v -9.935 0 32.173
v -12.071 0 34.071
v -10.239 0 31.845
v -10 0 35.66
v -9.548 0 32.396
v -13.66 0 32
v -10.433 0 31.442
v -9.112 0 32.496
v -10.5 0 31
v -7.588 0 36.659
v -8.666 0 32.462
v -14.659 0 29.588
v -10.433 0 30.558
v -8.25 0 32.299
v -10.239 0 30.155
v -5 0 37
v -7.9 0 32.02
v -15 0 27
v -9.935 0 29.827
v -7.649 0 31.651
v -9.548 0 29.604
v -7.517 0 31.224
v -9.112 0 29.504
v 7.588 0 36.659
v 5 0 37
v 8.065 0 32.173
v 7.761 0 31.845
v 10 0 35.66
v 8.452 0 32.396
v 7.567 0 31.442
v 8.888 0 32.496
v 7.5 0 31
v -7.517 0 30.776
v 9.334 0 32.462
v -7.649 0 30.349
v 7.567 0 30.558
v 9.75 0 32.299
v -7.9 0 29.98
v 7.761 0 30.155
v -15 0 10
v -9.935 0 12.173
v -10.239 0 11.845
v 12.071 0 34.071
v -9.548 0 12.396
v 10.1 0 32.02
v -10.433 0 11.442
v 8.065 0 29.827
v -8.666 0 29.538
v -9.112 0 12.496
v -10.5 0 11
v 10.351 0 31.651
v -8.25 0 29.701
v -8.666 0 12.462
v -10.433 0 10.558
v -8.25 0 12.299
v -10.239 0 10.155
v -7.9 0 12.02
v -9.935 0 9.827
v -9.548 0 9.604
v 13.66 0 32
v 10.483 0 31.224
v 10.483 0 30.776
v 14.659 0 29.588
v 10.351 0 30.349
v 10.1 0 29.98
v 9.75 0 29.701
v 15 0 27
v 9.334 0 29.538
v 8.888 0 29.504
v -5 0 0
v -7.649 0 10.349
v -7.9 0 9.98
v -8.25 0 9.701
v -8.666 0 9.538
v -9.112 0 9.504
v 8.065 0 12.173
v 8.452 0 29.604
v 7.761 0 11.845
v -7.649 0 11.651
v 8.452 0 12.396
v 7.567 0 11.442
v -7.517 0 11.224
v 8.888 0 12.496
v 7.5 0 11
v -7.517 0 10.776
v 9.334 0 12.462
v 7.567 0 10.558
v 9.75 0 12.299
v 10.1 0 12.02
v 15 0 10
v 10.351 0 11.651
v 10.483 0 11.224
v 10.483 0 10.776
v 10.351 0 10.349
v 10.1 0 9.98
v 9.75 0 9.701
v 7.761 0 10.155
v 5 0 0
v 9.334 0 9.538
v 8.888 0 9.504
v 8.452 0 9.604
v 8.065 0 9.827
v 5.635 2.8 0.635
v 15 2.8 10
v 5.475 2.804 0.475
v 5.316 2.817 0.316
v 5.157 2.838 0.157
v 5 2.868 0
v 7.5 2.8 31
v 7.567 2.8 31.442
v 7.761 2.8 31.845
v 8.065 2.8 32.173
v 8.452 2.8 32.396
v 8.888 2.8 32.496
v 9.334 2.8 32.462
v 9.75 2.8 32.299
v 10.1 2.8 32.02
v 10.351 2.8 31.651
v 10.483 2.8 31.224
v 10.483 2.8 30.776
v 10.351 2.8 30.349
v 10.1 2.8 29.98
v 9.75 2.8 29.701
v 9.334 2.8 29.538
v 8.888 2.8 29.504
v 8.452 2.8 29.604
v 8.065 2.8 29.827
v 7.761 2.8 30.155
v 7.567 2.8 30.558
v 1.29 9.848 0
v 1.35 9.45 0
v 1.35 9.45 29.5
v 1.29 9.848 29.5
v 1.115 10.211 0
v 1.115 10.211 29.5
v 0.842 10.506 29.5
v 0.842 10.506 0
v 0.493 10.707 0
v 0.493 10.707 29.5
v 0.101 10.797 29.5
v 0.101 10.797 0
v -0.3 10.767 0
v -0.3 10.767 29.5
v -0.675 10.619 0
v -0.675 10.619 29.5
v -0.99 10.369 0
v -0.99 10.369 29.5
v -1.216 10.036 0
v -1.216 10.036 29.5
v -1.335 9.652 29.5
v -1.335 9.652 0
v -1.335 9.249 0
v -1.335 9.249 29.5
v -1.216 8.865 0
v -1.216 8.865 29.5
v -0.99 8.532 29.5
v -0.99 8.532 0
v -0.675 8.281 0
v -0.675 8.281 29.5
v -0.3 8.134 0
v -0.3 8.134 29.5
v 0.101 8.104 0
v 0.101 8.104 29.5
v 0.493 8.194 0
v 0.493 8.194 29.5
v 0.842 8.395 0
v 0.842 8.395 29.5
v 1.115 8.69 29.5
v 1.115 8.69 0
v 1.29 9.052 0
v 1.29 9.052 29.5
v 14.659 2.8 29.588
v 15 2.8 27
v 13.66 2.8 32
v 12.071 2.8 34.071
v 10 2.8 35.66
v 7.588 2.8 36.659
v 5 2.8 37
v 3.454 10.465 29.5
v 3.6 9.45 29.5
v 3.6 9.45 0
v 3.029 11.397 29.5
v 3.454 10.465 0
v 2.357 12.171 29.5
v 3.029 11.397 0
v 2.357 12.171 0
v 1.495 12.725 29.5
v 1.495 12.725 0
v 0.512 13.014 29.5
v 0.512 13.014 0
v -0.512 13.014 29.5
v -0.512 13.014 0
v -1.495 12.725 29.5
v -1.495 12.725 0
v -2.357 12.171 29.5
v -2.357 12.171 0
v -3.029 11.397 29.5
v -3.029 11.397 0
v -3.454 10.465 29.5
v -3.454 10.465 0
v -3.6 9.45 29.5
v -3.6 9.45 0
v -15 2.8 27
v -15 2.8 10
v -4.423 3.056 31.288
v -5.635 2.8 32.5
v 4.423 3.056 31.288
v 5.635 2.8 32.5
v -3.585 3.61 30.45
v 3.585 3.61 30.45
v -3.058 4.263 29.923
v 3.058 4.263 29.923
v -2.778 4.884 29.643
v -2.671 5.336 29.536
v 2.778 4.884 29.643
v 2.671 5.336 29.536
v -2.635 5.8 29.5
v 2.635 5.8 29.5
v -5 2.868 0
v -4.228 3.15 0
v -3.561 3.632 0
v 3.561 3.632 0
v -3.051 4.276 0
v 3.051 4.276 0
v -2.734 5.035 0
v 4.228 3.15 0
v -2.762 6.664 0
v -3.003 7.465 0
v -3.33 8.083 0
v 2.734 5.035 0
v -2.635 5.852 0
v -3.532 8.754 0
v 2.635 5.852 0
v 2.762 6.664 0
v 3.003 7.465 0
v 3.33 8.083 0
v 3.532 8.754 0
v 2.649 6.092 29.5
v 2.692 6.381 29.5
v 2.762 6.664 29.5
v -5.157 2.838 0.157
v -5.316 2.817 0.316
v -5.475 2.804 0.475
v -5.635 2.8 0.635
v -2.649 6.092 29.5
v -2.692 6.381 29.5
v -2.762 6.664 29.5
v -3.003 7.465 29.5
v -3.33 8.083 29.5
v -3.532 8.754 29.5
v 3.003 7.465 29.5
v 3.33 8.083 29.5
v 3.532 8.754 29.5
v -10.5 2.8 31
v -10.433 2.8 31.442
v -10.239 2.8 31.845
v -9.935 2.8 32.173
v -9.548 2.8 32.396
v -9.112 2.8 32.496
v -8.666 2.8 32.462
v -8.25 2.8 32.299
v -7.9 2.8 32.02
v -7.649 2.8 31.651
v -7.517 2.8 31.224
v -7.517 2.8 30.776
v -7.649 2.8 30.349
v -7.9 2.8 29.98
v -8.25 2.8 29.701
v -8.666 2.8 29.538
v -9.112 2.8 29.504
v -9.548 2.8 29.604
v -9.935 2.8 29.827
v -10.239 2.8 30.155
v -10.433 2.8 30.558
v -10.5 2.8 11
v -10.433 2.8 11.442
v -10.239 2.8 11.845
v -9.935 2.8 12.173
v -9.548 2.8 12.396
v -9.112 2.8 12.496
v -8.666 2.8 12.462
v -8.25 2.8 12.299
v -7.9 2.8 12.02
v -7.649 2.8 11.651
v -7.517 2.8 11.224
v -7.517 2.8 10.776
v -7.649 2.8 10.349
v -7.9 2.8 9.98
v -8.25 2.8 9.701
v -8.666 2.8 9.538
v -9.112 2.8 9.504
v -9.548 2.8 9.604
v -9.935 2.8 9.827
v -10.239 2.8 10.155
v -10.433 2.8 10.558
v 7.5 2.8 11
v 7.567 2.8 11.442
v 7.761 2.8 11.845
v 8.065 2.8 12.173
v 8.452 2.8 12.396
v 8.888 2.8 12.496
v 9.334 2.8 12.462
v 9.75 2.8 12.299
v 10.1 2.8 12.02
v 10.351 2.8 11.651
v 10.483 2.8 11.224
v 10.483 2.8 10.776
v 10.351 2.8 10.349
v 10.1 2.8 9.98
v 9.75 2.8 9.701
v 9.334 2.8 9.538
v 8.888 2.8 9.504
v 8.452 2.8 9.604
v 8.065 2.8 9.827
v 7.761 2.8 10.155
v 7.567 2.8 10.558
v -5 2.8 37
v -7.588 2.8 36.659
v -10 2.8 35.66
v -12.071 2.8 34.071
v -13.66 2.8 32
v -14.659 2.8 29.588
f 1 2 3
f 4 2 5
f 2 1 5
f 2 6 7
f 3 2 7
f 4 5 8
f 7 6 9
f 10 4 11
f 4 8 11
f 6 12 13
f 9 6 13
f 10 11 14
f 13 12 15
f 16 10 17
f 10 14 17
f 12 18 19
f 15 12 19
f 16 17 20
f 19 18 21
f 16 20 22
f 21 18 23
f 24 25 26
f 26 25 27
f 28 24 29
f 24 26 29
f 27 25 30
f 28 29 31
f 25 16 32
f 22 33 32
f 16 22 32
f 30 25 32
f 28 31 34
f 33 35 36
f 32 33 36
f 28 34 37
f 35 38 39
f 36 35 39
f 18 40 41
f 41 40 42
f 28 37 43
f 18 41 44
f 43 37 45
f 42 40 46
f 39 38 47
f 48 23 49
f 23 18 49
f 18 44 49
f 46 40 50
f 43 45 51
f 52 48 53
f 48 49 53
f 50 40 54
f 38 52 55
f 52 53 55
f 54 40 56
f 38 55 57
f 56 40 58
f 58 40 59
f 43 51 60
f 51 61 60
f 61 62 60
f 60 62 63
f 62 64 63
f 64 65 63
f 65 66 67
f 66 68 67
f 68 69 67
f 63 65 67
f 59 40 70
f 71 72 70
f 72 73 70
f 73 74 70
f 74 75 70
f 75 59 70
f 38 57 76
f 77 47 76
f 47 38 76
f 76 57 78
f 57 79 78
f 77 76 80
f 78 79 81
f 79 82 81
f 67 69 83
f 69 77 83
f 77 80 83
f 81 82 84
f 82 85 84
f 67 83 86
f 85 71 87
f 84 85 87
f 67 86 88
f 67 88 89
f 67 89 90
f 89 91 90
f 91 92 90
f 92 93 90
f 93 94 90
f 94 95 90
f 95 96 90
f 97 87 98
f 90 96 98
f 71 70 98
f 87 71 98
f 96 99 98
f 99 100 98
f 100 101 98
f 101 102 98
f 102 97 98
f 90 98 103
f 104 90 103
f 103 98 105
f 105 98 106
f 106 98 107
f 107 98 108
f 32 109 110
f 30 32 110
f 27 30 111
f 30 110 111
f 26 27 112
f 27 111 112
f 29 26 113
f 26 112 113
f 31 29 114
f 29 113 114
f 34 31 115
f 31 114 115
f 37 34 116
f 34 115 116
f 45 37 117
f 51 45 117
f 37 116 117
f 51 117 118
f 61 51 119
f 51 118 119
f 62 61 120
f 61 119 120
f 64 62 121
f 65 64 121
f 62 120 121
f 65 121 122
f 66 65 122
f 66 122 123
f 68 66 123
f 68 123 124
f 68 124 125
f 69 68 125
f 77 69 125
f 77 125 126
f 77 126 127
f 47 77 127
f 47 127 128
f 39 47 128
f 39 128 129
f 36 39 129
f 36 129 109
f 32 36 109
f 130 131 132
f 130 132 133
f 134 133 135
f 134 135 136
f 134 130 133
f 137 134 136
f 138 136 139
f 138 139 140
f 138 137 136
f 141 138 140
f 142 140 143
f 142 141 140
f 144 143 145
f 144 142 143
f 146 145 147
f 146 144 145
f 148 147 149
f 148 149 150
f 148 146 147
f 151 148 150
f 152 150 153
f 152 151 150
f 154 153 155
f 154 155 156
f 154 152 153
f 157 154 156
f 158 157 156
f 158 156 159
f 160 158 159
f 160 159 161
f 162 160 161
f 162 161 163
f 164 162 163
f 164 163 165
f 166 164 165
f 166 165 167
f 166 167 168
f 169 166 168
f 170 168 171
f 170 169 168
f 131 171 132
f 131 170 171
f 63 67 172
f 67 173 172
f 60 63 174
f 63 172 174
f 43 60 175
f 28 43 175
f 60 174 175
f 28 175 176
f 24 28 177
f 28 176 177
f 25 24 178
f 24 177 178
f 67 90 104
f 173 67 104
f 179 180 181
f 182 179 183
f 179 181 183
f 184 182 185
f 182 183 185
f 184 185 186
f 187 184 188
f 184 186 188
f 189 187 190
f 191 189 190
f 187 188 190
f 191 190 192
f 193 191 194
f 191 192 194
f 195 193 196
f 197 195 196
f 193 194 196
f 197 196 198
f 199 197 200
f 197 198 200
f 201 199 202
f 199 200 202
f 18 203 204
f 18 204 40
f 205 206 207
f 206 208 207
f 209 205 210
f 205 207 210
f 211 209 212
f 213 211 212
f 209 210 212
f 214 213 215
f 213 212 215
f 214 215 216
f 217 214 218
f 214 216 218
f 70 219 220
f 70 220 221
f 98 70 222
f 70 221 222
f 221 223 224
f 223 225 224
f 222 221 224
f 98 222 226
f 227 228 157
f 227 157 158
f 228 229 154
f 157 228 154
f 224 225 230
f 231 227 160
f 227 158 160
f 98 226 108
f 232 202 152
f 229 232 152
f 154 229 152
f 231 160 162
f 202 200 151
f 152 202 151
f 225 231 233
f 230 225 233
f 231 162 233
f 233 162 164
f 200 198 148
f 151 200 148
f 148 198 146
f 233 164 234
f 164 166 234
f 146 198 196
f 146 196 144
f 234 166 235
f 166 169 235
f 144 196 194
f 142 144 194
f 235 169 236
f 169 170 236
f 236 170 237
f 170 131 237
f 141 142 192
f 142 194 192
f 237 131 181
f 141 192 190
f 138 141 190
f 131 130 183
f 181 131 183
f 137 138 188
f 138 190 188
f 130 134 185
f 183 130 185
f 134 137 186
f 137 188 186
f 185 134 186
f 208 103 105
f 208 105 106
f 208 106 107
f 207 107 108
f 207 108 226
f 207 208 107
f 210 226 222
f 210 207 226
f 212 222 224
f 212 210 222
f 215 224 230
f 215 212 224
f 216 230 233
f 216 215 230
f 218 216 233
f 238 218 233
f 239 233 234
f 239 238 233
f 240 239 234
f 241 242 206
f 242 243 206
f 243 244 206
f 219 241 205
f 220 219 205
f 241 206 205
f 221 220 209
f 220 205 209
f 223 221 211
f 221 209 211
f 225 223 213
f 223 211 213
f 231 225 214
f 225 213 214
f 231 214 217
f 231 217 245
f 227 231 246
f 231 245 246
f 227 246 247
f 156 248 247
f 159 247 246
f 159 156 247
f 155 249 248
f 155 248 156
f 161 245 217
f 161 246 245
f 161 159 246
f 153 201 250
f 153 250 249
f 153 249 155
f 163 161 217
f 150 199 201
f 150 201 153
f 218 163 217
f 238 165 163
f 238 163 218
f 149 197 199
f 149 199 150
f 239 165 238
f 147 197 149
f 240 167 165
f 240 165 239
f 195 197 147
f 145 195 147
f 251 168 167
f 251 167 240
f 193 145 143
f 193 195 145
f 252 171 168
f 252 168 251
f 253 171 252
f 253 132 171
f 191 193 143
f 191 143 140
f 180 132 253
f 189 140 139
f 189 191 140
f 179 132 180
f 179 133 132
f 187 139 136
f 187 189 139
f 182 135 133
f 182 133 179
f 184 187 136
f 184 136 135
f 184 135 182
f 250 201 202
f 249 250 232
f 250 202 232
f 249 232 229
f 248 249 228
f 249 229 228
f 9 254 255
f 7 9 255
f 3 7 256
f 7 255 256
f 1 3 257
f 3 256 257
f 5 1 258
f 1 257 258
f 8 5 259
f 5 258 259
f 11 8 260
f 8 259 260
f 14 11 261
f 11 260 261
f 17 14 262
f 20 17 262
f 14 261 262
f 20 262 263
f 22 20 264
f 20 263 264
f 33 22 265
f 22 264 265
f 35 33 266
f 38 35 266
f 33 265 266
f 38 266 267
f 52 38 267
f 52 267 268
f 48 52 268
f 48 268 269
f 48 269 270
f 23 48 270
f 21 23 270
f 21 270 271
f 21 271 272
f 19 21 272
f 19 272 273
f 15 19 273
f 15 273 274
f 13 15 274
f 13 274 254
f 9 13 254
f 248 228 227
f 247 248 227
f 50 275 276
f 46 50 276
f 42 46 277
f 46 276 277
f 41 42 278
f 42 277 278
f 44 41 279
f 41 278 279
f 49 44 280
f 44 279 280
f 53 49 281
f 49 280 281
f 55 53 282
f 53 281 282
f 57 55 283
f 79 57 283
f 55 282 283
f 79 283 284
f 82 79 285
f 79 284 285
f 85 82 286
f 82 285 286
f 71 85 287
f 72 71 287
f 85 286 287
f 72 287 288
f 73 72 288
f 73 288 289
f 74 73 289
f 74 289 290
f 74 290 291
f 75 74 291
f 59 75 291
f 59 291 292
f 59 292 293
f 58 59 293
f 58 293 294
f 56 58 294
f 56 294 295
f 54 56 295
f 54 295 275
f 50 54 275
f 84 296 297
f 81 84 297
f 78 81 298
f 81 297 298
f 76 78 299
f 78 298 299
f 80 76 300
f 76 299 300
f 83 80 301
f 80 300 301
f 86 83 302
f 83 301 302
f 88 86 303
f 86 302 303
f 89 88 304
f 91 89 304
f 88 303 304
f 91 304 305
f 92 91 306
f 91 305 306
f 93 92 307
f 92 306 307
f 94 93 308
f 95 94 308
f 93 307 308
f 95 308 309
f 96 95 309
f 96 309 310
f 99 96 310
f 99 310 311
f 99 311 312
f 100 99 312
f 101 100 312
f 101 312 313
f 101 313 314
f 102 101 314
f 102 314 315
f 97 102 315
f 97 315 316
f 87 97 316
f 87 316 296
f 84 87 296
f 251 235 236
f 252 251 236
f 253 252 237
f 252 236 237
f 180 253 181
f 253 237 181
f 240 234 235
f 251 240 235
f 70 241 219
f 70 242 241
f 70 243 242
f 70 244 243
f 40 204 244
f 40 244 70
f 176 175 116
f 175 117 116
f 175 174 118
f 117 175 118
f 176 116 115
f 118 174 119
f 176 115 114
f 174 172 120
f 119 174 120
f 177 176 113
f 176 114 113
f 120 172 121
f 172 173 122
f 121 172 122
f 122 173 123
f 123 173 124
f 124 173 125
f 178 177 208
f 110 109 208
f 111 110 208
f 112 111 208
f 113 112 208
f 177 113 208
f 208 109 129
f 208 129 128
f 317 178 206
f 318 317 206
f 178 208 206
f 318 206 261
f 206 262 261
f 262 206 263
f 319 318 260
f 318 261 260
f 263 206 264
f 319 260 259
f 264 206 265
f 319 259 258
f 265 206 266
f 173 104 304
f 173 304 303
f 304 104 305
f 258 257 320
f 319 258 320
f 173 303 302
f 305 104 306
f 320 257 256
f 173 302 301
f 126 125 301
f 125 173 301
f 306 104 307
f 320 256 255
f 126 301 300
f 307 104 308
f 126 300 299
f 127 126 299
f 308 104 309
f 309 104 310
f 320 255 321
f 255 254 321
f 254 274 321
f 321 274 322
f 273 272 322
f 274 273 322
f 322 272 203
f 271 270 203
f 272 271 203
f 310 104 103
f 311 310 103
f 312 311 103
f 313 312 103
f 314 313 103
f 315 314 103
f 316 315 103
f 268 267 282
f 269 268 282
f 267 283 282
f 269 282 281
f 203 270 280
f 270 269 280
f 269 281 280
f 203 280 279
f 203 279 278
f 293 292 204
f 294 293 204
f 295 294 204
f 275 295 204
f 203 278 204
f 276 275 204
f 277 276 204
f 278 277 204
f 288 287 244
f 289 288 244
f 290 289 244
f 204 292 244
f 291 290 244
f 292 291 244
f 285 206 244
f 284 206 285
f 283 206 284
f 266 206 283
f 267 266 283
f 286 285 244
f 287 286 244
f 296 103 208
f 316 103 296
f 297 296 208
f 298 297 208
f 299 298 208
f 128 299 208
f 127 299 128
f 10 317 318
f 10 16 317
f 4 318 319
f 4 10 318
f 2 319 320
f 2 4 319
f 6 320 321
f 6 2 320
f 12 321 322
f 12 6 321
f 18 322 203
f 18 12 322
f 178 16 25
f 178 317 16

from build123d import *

# Parameters (mm, degrees)
F0_R     = 1.35
F1_DEPTH = 29.5
F2_DEPTH = 37
F3_R     = 3
F4_R     = 10
F5_SIZE  = 10
F6_R     = 1.5
F7_DEPTH = 25


with BuildPart() as f1:
    # F0 (on Top) → F1 (new body)
    with BuildSketch(Plane.XY):
        with BuildLine():
            Line((-1.6, 2.8), (1.6, 2.8))
            Line((1.6, 2.8), (3.0028275917, 7.4646537393))
            ThreePointArc((3.0028275917, 7.4646537393), (0, 5.85035927), (-3.0028275917, 7.4646537393))
            Line((-3.0028275917, 7.4646537393), (-1.6, 2.8))
        make_face()
        with BuildLine():
            ThreePointArc((-3.0028275917, 7.4646537393), (0, 5.85035927), (3.0028275917, 7.4646537393))
            Line((3.0028275917, 7.4646537393), (3.6, 9.45035927))
            ThreePointArc((3.6, 9.45035927), (0, 13.05035927), (-3.6, 9.45035927))
            Line((-3.6, 9.45035927), (-3.0028275917, 7.4646537393))
        make_face()
        with Locations((0, 9.45035927)):
            Circle(F0_R, mode=Mode.SUBTRACT)
        Polygon((-15, 0), (15, 0), (15, 2.8), (1.6, 2.8), (-1.6, 2.8), (-15, 2.8), align=None)
        with BuildLine():
            ThreePointArc((-3.6, 9.45035927), (-3.4474758397, 8.4135804435), (-3.0028275917, 7.4646537393))
            Line((-3.0028275917, 7.4646537393), (-3.6, 9.45035927))
        make_face()
        with BuildLine():
            Line((3.6, 9.45035927), (3.0028275917, 7.4646537393))
            ThreePointArc((3.0028275917, 7.4646537393), (3.4474758397, 8.4135804435), (3.6, 9.45035927))
        make_face()
    extrude(amount=F1_DEPTH)

    # F0 (on Top) → F2 (join)
    with BuildSketch(Plane.XY):
        Polygon((-15, 0), (15, 0), (15, 2.8), (1.6, 2.8), (-1.6, 2.8), (-15, 2.8), align=None)
    extrude(amount=F2_DEPTH)

    # F3
    f3_edges = [f1.edges().sort_by_distance(p)[0] for p in [
        (-1.6, 2.8, 14.75),
        (1.6, 2.8, 14.75),
        (0, 2.8, 29.5),
    ]]
    fillet(f3_edges, radius=F3_R)

    # F4
    f4_edges = [f1.edges().sort_by_distance(p)[0] for p in [
        (-15, 1.4, 37),
        (15, 1.4, 37),
    ]]
    fillet(f4_edges, radius=F4_R)

    # F5
    f5_edges = [f1.edges().sort_by_distance(p)[0] for p in [
        (15, 1.4, 0),
        (-15, 1.4, 0),
    ]]
    chamfer(f5_edges, length=F5_SIZE)

    # F6 (on face) → F7 (cut)
    with BuildSketch(Plane(origin=(0, 2.8, 0), x_dir=(-1, 0, 0), z_dir=(0, 1, 0))):
        with Locations((-9, 31)):
            Circle(F6_R)
        with Locations((9, 31)):
            Circle(F6_R)
        with Locations((-9, 11)):
            Circle(F6_R)
        with Locations((9, 11)):
            Circle(F6_R)
    extrude(amount=-F7_DEPTH, mode=Mode.SUBTRACT)


solid = f1.part
